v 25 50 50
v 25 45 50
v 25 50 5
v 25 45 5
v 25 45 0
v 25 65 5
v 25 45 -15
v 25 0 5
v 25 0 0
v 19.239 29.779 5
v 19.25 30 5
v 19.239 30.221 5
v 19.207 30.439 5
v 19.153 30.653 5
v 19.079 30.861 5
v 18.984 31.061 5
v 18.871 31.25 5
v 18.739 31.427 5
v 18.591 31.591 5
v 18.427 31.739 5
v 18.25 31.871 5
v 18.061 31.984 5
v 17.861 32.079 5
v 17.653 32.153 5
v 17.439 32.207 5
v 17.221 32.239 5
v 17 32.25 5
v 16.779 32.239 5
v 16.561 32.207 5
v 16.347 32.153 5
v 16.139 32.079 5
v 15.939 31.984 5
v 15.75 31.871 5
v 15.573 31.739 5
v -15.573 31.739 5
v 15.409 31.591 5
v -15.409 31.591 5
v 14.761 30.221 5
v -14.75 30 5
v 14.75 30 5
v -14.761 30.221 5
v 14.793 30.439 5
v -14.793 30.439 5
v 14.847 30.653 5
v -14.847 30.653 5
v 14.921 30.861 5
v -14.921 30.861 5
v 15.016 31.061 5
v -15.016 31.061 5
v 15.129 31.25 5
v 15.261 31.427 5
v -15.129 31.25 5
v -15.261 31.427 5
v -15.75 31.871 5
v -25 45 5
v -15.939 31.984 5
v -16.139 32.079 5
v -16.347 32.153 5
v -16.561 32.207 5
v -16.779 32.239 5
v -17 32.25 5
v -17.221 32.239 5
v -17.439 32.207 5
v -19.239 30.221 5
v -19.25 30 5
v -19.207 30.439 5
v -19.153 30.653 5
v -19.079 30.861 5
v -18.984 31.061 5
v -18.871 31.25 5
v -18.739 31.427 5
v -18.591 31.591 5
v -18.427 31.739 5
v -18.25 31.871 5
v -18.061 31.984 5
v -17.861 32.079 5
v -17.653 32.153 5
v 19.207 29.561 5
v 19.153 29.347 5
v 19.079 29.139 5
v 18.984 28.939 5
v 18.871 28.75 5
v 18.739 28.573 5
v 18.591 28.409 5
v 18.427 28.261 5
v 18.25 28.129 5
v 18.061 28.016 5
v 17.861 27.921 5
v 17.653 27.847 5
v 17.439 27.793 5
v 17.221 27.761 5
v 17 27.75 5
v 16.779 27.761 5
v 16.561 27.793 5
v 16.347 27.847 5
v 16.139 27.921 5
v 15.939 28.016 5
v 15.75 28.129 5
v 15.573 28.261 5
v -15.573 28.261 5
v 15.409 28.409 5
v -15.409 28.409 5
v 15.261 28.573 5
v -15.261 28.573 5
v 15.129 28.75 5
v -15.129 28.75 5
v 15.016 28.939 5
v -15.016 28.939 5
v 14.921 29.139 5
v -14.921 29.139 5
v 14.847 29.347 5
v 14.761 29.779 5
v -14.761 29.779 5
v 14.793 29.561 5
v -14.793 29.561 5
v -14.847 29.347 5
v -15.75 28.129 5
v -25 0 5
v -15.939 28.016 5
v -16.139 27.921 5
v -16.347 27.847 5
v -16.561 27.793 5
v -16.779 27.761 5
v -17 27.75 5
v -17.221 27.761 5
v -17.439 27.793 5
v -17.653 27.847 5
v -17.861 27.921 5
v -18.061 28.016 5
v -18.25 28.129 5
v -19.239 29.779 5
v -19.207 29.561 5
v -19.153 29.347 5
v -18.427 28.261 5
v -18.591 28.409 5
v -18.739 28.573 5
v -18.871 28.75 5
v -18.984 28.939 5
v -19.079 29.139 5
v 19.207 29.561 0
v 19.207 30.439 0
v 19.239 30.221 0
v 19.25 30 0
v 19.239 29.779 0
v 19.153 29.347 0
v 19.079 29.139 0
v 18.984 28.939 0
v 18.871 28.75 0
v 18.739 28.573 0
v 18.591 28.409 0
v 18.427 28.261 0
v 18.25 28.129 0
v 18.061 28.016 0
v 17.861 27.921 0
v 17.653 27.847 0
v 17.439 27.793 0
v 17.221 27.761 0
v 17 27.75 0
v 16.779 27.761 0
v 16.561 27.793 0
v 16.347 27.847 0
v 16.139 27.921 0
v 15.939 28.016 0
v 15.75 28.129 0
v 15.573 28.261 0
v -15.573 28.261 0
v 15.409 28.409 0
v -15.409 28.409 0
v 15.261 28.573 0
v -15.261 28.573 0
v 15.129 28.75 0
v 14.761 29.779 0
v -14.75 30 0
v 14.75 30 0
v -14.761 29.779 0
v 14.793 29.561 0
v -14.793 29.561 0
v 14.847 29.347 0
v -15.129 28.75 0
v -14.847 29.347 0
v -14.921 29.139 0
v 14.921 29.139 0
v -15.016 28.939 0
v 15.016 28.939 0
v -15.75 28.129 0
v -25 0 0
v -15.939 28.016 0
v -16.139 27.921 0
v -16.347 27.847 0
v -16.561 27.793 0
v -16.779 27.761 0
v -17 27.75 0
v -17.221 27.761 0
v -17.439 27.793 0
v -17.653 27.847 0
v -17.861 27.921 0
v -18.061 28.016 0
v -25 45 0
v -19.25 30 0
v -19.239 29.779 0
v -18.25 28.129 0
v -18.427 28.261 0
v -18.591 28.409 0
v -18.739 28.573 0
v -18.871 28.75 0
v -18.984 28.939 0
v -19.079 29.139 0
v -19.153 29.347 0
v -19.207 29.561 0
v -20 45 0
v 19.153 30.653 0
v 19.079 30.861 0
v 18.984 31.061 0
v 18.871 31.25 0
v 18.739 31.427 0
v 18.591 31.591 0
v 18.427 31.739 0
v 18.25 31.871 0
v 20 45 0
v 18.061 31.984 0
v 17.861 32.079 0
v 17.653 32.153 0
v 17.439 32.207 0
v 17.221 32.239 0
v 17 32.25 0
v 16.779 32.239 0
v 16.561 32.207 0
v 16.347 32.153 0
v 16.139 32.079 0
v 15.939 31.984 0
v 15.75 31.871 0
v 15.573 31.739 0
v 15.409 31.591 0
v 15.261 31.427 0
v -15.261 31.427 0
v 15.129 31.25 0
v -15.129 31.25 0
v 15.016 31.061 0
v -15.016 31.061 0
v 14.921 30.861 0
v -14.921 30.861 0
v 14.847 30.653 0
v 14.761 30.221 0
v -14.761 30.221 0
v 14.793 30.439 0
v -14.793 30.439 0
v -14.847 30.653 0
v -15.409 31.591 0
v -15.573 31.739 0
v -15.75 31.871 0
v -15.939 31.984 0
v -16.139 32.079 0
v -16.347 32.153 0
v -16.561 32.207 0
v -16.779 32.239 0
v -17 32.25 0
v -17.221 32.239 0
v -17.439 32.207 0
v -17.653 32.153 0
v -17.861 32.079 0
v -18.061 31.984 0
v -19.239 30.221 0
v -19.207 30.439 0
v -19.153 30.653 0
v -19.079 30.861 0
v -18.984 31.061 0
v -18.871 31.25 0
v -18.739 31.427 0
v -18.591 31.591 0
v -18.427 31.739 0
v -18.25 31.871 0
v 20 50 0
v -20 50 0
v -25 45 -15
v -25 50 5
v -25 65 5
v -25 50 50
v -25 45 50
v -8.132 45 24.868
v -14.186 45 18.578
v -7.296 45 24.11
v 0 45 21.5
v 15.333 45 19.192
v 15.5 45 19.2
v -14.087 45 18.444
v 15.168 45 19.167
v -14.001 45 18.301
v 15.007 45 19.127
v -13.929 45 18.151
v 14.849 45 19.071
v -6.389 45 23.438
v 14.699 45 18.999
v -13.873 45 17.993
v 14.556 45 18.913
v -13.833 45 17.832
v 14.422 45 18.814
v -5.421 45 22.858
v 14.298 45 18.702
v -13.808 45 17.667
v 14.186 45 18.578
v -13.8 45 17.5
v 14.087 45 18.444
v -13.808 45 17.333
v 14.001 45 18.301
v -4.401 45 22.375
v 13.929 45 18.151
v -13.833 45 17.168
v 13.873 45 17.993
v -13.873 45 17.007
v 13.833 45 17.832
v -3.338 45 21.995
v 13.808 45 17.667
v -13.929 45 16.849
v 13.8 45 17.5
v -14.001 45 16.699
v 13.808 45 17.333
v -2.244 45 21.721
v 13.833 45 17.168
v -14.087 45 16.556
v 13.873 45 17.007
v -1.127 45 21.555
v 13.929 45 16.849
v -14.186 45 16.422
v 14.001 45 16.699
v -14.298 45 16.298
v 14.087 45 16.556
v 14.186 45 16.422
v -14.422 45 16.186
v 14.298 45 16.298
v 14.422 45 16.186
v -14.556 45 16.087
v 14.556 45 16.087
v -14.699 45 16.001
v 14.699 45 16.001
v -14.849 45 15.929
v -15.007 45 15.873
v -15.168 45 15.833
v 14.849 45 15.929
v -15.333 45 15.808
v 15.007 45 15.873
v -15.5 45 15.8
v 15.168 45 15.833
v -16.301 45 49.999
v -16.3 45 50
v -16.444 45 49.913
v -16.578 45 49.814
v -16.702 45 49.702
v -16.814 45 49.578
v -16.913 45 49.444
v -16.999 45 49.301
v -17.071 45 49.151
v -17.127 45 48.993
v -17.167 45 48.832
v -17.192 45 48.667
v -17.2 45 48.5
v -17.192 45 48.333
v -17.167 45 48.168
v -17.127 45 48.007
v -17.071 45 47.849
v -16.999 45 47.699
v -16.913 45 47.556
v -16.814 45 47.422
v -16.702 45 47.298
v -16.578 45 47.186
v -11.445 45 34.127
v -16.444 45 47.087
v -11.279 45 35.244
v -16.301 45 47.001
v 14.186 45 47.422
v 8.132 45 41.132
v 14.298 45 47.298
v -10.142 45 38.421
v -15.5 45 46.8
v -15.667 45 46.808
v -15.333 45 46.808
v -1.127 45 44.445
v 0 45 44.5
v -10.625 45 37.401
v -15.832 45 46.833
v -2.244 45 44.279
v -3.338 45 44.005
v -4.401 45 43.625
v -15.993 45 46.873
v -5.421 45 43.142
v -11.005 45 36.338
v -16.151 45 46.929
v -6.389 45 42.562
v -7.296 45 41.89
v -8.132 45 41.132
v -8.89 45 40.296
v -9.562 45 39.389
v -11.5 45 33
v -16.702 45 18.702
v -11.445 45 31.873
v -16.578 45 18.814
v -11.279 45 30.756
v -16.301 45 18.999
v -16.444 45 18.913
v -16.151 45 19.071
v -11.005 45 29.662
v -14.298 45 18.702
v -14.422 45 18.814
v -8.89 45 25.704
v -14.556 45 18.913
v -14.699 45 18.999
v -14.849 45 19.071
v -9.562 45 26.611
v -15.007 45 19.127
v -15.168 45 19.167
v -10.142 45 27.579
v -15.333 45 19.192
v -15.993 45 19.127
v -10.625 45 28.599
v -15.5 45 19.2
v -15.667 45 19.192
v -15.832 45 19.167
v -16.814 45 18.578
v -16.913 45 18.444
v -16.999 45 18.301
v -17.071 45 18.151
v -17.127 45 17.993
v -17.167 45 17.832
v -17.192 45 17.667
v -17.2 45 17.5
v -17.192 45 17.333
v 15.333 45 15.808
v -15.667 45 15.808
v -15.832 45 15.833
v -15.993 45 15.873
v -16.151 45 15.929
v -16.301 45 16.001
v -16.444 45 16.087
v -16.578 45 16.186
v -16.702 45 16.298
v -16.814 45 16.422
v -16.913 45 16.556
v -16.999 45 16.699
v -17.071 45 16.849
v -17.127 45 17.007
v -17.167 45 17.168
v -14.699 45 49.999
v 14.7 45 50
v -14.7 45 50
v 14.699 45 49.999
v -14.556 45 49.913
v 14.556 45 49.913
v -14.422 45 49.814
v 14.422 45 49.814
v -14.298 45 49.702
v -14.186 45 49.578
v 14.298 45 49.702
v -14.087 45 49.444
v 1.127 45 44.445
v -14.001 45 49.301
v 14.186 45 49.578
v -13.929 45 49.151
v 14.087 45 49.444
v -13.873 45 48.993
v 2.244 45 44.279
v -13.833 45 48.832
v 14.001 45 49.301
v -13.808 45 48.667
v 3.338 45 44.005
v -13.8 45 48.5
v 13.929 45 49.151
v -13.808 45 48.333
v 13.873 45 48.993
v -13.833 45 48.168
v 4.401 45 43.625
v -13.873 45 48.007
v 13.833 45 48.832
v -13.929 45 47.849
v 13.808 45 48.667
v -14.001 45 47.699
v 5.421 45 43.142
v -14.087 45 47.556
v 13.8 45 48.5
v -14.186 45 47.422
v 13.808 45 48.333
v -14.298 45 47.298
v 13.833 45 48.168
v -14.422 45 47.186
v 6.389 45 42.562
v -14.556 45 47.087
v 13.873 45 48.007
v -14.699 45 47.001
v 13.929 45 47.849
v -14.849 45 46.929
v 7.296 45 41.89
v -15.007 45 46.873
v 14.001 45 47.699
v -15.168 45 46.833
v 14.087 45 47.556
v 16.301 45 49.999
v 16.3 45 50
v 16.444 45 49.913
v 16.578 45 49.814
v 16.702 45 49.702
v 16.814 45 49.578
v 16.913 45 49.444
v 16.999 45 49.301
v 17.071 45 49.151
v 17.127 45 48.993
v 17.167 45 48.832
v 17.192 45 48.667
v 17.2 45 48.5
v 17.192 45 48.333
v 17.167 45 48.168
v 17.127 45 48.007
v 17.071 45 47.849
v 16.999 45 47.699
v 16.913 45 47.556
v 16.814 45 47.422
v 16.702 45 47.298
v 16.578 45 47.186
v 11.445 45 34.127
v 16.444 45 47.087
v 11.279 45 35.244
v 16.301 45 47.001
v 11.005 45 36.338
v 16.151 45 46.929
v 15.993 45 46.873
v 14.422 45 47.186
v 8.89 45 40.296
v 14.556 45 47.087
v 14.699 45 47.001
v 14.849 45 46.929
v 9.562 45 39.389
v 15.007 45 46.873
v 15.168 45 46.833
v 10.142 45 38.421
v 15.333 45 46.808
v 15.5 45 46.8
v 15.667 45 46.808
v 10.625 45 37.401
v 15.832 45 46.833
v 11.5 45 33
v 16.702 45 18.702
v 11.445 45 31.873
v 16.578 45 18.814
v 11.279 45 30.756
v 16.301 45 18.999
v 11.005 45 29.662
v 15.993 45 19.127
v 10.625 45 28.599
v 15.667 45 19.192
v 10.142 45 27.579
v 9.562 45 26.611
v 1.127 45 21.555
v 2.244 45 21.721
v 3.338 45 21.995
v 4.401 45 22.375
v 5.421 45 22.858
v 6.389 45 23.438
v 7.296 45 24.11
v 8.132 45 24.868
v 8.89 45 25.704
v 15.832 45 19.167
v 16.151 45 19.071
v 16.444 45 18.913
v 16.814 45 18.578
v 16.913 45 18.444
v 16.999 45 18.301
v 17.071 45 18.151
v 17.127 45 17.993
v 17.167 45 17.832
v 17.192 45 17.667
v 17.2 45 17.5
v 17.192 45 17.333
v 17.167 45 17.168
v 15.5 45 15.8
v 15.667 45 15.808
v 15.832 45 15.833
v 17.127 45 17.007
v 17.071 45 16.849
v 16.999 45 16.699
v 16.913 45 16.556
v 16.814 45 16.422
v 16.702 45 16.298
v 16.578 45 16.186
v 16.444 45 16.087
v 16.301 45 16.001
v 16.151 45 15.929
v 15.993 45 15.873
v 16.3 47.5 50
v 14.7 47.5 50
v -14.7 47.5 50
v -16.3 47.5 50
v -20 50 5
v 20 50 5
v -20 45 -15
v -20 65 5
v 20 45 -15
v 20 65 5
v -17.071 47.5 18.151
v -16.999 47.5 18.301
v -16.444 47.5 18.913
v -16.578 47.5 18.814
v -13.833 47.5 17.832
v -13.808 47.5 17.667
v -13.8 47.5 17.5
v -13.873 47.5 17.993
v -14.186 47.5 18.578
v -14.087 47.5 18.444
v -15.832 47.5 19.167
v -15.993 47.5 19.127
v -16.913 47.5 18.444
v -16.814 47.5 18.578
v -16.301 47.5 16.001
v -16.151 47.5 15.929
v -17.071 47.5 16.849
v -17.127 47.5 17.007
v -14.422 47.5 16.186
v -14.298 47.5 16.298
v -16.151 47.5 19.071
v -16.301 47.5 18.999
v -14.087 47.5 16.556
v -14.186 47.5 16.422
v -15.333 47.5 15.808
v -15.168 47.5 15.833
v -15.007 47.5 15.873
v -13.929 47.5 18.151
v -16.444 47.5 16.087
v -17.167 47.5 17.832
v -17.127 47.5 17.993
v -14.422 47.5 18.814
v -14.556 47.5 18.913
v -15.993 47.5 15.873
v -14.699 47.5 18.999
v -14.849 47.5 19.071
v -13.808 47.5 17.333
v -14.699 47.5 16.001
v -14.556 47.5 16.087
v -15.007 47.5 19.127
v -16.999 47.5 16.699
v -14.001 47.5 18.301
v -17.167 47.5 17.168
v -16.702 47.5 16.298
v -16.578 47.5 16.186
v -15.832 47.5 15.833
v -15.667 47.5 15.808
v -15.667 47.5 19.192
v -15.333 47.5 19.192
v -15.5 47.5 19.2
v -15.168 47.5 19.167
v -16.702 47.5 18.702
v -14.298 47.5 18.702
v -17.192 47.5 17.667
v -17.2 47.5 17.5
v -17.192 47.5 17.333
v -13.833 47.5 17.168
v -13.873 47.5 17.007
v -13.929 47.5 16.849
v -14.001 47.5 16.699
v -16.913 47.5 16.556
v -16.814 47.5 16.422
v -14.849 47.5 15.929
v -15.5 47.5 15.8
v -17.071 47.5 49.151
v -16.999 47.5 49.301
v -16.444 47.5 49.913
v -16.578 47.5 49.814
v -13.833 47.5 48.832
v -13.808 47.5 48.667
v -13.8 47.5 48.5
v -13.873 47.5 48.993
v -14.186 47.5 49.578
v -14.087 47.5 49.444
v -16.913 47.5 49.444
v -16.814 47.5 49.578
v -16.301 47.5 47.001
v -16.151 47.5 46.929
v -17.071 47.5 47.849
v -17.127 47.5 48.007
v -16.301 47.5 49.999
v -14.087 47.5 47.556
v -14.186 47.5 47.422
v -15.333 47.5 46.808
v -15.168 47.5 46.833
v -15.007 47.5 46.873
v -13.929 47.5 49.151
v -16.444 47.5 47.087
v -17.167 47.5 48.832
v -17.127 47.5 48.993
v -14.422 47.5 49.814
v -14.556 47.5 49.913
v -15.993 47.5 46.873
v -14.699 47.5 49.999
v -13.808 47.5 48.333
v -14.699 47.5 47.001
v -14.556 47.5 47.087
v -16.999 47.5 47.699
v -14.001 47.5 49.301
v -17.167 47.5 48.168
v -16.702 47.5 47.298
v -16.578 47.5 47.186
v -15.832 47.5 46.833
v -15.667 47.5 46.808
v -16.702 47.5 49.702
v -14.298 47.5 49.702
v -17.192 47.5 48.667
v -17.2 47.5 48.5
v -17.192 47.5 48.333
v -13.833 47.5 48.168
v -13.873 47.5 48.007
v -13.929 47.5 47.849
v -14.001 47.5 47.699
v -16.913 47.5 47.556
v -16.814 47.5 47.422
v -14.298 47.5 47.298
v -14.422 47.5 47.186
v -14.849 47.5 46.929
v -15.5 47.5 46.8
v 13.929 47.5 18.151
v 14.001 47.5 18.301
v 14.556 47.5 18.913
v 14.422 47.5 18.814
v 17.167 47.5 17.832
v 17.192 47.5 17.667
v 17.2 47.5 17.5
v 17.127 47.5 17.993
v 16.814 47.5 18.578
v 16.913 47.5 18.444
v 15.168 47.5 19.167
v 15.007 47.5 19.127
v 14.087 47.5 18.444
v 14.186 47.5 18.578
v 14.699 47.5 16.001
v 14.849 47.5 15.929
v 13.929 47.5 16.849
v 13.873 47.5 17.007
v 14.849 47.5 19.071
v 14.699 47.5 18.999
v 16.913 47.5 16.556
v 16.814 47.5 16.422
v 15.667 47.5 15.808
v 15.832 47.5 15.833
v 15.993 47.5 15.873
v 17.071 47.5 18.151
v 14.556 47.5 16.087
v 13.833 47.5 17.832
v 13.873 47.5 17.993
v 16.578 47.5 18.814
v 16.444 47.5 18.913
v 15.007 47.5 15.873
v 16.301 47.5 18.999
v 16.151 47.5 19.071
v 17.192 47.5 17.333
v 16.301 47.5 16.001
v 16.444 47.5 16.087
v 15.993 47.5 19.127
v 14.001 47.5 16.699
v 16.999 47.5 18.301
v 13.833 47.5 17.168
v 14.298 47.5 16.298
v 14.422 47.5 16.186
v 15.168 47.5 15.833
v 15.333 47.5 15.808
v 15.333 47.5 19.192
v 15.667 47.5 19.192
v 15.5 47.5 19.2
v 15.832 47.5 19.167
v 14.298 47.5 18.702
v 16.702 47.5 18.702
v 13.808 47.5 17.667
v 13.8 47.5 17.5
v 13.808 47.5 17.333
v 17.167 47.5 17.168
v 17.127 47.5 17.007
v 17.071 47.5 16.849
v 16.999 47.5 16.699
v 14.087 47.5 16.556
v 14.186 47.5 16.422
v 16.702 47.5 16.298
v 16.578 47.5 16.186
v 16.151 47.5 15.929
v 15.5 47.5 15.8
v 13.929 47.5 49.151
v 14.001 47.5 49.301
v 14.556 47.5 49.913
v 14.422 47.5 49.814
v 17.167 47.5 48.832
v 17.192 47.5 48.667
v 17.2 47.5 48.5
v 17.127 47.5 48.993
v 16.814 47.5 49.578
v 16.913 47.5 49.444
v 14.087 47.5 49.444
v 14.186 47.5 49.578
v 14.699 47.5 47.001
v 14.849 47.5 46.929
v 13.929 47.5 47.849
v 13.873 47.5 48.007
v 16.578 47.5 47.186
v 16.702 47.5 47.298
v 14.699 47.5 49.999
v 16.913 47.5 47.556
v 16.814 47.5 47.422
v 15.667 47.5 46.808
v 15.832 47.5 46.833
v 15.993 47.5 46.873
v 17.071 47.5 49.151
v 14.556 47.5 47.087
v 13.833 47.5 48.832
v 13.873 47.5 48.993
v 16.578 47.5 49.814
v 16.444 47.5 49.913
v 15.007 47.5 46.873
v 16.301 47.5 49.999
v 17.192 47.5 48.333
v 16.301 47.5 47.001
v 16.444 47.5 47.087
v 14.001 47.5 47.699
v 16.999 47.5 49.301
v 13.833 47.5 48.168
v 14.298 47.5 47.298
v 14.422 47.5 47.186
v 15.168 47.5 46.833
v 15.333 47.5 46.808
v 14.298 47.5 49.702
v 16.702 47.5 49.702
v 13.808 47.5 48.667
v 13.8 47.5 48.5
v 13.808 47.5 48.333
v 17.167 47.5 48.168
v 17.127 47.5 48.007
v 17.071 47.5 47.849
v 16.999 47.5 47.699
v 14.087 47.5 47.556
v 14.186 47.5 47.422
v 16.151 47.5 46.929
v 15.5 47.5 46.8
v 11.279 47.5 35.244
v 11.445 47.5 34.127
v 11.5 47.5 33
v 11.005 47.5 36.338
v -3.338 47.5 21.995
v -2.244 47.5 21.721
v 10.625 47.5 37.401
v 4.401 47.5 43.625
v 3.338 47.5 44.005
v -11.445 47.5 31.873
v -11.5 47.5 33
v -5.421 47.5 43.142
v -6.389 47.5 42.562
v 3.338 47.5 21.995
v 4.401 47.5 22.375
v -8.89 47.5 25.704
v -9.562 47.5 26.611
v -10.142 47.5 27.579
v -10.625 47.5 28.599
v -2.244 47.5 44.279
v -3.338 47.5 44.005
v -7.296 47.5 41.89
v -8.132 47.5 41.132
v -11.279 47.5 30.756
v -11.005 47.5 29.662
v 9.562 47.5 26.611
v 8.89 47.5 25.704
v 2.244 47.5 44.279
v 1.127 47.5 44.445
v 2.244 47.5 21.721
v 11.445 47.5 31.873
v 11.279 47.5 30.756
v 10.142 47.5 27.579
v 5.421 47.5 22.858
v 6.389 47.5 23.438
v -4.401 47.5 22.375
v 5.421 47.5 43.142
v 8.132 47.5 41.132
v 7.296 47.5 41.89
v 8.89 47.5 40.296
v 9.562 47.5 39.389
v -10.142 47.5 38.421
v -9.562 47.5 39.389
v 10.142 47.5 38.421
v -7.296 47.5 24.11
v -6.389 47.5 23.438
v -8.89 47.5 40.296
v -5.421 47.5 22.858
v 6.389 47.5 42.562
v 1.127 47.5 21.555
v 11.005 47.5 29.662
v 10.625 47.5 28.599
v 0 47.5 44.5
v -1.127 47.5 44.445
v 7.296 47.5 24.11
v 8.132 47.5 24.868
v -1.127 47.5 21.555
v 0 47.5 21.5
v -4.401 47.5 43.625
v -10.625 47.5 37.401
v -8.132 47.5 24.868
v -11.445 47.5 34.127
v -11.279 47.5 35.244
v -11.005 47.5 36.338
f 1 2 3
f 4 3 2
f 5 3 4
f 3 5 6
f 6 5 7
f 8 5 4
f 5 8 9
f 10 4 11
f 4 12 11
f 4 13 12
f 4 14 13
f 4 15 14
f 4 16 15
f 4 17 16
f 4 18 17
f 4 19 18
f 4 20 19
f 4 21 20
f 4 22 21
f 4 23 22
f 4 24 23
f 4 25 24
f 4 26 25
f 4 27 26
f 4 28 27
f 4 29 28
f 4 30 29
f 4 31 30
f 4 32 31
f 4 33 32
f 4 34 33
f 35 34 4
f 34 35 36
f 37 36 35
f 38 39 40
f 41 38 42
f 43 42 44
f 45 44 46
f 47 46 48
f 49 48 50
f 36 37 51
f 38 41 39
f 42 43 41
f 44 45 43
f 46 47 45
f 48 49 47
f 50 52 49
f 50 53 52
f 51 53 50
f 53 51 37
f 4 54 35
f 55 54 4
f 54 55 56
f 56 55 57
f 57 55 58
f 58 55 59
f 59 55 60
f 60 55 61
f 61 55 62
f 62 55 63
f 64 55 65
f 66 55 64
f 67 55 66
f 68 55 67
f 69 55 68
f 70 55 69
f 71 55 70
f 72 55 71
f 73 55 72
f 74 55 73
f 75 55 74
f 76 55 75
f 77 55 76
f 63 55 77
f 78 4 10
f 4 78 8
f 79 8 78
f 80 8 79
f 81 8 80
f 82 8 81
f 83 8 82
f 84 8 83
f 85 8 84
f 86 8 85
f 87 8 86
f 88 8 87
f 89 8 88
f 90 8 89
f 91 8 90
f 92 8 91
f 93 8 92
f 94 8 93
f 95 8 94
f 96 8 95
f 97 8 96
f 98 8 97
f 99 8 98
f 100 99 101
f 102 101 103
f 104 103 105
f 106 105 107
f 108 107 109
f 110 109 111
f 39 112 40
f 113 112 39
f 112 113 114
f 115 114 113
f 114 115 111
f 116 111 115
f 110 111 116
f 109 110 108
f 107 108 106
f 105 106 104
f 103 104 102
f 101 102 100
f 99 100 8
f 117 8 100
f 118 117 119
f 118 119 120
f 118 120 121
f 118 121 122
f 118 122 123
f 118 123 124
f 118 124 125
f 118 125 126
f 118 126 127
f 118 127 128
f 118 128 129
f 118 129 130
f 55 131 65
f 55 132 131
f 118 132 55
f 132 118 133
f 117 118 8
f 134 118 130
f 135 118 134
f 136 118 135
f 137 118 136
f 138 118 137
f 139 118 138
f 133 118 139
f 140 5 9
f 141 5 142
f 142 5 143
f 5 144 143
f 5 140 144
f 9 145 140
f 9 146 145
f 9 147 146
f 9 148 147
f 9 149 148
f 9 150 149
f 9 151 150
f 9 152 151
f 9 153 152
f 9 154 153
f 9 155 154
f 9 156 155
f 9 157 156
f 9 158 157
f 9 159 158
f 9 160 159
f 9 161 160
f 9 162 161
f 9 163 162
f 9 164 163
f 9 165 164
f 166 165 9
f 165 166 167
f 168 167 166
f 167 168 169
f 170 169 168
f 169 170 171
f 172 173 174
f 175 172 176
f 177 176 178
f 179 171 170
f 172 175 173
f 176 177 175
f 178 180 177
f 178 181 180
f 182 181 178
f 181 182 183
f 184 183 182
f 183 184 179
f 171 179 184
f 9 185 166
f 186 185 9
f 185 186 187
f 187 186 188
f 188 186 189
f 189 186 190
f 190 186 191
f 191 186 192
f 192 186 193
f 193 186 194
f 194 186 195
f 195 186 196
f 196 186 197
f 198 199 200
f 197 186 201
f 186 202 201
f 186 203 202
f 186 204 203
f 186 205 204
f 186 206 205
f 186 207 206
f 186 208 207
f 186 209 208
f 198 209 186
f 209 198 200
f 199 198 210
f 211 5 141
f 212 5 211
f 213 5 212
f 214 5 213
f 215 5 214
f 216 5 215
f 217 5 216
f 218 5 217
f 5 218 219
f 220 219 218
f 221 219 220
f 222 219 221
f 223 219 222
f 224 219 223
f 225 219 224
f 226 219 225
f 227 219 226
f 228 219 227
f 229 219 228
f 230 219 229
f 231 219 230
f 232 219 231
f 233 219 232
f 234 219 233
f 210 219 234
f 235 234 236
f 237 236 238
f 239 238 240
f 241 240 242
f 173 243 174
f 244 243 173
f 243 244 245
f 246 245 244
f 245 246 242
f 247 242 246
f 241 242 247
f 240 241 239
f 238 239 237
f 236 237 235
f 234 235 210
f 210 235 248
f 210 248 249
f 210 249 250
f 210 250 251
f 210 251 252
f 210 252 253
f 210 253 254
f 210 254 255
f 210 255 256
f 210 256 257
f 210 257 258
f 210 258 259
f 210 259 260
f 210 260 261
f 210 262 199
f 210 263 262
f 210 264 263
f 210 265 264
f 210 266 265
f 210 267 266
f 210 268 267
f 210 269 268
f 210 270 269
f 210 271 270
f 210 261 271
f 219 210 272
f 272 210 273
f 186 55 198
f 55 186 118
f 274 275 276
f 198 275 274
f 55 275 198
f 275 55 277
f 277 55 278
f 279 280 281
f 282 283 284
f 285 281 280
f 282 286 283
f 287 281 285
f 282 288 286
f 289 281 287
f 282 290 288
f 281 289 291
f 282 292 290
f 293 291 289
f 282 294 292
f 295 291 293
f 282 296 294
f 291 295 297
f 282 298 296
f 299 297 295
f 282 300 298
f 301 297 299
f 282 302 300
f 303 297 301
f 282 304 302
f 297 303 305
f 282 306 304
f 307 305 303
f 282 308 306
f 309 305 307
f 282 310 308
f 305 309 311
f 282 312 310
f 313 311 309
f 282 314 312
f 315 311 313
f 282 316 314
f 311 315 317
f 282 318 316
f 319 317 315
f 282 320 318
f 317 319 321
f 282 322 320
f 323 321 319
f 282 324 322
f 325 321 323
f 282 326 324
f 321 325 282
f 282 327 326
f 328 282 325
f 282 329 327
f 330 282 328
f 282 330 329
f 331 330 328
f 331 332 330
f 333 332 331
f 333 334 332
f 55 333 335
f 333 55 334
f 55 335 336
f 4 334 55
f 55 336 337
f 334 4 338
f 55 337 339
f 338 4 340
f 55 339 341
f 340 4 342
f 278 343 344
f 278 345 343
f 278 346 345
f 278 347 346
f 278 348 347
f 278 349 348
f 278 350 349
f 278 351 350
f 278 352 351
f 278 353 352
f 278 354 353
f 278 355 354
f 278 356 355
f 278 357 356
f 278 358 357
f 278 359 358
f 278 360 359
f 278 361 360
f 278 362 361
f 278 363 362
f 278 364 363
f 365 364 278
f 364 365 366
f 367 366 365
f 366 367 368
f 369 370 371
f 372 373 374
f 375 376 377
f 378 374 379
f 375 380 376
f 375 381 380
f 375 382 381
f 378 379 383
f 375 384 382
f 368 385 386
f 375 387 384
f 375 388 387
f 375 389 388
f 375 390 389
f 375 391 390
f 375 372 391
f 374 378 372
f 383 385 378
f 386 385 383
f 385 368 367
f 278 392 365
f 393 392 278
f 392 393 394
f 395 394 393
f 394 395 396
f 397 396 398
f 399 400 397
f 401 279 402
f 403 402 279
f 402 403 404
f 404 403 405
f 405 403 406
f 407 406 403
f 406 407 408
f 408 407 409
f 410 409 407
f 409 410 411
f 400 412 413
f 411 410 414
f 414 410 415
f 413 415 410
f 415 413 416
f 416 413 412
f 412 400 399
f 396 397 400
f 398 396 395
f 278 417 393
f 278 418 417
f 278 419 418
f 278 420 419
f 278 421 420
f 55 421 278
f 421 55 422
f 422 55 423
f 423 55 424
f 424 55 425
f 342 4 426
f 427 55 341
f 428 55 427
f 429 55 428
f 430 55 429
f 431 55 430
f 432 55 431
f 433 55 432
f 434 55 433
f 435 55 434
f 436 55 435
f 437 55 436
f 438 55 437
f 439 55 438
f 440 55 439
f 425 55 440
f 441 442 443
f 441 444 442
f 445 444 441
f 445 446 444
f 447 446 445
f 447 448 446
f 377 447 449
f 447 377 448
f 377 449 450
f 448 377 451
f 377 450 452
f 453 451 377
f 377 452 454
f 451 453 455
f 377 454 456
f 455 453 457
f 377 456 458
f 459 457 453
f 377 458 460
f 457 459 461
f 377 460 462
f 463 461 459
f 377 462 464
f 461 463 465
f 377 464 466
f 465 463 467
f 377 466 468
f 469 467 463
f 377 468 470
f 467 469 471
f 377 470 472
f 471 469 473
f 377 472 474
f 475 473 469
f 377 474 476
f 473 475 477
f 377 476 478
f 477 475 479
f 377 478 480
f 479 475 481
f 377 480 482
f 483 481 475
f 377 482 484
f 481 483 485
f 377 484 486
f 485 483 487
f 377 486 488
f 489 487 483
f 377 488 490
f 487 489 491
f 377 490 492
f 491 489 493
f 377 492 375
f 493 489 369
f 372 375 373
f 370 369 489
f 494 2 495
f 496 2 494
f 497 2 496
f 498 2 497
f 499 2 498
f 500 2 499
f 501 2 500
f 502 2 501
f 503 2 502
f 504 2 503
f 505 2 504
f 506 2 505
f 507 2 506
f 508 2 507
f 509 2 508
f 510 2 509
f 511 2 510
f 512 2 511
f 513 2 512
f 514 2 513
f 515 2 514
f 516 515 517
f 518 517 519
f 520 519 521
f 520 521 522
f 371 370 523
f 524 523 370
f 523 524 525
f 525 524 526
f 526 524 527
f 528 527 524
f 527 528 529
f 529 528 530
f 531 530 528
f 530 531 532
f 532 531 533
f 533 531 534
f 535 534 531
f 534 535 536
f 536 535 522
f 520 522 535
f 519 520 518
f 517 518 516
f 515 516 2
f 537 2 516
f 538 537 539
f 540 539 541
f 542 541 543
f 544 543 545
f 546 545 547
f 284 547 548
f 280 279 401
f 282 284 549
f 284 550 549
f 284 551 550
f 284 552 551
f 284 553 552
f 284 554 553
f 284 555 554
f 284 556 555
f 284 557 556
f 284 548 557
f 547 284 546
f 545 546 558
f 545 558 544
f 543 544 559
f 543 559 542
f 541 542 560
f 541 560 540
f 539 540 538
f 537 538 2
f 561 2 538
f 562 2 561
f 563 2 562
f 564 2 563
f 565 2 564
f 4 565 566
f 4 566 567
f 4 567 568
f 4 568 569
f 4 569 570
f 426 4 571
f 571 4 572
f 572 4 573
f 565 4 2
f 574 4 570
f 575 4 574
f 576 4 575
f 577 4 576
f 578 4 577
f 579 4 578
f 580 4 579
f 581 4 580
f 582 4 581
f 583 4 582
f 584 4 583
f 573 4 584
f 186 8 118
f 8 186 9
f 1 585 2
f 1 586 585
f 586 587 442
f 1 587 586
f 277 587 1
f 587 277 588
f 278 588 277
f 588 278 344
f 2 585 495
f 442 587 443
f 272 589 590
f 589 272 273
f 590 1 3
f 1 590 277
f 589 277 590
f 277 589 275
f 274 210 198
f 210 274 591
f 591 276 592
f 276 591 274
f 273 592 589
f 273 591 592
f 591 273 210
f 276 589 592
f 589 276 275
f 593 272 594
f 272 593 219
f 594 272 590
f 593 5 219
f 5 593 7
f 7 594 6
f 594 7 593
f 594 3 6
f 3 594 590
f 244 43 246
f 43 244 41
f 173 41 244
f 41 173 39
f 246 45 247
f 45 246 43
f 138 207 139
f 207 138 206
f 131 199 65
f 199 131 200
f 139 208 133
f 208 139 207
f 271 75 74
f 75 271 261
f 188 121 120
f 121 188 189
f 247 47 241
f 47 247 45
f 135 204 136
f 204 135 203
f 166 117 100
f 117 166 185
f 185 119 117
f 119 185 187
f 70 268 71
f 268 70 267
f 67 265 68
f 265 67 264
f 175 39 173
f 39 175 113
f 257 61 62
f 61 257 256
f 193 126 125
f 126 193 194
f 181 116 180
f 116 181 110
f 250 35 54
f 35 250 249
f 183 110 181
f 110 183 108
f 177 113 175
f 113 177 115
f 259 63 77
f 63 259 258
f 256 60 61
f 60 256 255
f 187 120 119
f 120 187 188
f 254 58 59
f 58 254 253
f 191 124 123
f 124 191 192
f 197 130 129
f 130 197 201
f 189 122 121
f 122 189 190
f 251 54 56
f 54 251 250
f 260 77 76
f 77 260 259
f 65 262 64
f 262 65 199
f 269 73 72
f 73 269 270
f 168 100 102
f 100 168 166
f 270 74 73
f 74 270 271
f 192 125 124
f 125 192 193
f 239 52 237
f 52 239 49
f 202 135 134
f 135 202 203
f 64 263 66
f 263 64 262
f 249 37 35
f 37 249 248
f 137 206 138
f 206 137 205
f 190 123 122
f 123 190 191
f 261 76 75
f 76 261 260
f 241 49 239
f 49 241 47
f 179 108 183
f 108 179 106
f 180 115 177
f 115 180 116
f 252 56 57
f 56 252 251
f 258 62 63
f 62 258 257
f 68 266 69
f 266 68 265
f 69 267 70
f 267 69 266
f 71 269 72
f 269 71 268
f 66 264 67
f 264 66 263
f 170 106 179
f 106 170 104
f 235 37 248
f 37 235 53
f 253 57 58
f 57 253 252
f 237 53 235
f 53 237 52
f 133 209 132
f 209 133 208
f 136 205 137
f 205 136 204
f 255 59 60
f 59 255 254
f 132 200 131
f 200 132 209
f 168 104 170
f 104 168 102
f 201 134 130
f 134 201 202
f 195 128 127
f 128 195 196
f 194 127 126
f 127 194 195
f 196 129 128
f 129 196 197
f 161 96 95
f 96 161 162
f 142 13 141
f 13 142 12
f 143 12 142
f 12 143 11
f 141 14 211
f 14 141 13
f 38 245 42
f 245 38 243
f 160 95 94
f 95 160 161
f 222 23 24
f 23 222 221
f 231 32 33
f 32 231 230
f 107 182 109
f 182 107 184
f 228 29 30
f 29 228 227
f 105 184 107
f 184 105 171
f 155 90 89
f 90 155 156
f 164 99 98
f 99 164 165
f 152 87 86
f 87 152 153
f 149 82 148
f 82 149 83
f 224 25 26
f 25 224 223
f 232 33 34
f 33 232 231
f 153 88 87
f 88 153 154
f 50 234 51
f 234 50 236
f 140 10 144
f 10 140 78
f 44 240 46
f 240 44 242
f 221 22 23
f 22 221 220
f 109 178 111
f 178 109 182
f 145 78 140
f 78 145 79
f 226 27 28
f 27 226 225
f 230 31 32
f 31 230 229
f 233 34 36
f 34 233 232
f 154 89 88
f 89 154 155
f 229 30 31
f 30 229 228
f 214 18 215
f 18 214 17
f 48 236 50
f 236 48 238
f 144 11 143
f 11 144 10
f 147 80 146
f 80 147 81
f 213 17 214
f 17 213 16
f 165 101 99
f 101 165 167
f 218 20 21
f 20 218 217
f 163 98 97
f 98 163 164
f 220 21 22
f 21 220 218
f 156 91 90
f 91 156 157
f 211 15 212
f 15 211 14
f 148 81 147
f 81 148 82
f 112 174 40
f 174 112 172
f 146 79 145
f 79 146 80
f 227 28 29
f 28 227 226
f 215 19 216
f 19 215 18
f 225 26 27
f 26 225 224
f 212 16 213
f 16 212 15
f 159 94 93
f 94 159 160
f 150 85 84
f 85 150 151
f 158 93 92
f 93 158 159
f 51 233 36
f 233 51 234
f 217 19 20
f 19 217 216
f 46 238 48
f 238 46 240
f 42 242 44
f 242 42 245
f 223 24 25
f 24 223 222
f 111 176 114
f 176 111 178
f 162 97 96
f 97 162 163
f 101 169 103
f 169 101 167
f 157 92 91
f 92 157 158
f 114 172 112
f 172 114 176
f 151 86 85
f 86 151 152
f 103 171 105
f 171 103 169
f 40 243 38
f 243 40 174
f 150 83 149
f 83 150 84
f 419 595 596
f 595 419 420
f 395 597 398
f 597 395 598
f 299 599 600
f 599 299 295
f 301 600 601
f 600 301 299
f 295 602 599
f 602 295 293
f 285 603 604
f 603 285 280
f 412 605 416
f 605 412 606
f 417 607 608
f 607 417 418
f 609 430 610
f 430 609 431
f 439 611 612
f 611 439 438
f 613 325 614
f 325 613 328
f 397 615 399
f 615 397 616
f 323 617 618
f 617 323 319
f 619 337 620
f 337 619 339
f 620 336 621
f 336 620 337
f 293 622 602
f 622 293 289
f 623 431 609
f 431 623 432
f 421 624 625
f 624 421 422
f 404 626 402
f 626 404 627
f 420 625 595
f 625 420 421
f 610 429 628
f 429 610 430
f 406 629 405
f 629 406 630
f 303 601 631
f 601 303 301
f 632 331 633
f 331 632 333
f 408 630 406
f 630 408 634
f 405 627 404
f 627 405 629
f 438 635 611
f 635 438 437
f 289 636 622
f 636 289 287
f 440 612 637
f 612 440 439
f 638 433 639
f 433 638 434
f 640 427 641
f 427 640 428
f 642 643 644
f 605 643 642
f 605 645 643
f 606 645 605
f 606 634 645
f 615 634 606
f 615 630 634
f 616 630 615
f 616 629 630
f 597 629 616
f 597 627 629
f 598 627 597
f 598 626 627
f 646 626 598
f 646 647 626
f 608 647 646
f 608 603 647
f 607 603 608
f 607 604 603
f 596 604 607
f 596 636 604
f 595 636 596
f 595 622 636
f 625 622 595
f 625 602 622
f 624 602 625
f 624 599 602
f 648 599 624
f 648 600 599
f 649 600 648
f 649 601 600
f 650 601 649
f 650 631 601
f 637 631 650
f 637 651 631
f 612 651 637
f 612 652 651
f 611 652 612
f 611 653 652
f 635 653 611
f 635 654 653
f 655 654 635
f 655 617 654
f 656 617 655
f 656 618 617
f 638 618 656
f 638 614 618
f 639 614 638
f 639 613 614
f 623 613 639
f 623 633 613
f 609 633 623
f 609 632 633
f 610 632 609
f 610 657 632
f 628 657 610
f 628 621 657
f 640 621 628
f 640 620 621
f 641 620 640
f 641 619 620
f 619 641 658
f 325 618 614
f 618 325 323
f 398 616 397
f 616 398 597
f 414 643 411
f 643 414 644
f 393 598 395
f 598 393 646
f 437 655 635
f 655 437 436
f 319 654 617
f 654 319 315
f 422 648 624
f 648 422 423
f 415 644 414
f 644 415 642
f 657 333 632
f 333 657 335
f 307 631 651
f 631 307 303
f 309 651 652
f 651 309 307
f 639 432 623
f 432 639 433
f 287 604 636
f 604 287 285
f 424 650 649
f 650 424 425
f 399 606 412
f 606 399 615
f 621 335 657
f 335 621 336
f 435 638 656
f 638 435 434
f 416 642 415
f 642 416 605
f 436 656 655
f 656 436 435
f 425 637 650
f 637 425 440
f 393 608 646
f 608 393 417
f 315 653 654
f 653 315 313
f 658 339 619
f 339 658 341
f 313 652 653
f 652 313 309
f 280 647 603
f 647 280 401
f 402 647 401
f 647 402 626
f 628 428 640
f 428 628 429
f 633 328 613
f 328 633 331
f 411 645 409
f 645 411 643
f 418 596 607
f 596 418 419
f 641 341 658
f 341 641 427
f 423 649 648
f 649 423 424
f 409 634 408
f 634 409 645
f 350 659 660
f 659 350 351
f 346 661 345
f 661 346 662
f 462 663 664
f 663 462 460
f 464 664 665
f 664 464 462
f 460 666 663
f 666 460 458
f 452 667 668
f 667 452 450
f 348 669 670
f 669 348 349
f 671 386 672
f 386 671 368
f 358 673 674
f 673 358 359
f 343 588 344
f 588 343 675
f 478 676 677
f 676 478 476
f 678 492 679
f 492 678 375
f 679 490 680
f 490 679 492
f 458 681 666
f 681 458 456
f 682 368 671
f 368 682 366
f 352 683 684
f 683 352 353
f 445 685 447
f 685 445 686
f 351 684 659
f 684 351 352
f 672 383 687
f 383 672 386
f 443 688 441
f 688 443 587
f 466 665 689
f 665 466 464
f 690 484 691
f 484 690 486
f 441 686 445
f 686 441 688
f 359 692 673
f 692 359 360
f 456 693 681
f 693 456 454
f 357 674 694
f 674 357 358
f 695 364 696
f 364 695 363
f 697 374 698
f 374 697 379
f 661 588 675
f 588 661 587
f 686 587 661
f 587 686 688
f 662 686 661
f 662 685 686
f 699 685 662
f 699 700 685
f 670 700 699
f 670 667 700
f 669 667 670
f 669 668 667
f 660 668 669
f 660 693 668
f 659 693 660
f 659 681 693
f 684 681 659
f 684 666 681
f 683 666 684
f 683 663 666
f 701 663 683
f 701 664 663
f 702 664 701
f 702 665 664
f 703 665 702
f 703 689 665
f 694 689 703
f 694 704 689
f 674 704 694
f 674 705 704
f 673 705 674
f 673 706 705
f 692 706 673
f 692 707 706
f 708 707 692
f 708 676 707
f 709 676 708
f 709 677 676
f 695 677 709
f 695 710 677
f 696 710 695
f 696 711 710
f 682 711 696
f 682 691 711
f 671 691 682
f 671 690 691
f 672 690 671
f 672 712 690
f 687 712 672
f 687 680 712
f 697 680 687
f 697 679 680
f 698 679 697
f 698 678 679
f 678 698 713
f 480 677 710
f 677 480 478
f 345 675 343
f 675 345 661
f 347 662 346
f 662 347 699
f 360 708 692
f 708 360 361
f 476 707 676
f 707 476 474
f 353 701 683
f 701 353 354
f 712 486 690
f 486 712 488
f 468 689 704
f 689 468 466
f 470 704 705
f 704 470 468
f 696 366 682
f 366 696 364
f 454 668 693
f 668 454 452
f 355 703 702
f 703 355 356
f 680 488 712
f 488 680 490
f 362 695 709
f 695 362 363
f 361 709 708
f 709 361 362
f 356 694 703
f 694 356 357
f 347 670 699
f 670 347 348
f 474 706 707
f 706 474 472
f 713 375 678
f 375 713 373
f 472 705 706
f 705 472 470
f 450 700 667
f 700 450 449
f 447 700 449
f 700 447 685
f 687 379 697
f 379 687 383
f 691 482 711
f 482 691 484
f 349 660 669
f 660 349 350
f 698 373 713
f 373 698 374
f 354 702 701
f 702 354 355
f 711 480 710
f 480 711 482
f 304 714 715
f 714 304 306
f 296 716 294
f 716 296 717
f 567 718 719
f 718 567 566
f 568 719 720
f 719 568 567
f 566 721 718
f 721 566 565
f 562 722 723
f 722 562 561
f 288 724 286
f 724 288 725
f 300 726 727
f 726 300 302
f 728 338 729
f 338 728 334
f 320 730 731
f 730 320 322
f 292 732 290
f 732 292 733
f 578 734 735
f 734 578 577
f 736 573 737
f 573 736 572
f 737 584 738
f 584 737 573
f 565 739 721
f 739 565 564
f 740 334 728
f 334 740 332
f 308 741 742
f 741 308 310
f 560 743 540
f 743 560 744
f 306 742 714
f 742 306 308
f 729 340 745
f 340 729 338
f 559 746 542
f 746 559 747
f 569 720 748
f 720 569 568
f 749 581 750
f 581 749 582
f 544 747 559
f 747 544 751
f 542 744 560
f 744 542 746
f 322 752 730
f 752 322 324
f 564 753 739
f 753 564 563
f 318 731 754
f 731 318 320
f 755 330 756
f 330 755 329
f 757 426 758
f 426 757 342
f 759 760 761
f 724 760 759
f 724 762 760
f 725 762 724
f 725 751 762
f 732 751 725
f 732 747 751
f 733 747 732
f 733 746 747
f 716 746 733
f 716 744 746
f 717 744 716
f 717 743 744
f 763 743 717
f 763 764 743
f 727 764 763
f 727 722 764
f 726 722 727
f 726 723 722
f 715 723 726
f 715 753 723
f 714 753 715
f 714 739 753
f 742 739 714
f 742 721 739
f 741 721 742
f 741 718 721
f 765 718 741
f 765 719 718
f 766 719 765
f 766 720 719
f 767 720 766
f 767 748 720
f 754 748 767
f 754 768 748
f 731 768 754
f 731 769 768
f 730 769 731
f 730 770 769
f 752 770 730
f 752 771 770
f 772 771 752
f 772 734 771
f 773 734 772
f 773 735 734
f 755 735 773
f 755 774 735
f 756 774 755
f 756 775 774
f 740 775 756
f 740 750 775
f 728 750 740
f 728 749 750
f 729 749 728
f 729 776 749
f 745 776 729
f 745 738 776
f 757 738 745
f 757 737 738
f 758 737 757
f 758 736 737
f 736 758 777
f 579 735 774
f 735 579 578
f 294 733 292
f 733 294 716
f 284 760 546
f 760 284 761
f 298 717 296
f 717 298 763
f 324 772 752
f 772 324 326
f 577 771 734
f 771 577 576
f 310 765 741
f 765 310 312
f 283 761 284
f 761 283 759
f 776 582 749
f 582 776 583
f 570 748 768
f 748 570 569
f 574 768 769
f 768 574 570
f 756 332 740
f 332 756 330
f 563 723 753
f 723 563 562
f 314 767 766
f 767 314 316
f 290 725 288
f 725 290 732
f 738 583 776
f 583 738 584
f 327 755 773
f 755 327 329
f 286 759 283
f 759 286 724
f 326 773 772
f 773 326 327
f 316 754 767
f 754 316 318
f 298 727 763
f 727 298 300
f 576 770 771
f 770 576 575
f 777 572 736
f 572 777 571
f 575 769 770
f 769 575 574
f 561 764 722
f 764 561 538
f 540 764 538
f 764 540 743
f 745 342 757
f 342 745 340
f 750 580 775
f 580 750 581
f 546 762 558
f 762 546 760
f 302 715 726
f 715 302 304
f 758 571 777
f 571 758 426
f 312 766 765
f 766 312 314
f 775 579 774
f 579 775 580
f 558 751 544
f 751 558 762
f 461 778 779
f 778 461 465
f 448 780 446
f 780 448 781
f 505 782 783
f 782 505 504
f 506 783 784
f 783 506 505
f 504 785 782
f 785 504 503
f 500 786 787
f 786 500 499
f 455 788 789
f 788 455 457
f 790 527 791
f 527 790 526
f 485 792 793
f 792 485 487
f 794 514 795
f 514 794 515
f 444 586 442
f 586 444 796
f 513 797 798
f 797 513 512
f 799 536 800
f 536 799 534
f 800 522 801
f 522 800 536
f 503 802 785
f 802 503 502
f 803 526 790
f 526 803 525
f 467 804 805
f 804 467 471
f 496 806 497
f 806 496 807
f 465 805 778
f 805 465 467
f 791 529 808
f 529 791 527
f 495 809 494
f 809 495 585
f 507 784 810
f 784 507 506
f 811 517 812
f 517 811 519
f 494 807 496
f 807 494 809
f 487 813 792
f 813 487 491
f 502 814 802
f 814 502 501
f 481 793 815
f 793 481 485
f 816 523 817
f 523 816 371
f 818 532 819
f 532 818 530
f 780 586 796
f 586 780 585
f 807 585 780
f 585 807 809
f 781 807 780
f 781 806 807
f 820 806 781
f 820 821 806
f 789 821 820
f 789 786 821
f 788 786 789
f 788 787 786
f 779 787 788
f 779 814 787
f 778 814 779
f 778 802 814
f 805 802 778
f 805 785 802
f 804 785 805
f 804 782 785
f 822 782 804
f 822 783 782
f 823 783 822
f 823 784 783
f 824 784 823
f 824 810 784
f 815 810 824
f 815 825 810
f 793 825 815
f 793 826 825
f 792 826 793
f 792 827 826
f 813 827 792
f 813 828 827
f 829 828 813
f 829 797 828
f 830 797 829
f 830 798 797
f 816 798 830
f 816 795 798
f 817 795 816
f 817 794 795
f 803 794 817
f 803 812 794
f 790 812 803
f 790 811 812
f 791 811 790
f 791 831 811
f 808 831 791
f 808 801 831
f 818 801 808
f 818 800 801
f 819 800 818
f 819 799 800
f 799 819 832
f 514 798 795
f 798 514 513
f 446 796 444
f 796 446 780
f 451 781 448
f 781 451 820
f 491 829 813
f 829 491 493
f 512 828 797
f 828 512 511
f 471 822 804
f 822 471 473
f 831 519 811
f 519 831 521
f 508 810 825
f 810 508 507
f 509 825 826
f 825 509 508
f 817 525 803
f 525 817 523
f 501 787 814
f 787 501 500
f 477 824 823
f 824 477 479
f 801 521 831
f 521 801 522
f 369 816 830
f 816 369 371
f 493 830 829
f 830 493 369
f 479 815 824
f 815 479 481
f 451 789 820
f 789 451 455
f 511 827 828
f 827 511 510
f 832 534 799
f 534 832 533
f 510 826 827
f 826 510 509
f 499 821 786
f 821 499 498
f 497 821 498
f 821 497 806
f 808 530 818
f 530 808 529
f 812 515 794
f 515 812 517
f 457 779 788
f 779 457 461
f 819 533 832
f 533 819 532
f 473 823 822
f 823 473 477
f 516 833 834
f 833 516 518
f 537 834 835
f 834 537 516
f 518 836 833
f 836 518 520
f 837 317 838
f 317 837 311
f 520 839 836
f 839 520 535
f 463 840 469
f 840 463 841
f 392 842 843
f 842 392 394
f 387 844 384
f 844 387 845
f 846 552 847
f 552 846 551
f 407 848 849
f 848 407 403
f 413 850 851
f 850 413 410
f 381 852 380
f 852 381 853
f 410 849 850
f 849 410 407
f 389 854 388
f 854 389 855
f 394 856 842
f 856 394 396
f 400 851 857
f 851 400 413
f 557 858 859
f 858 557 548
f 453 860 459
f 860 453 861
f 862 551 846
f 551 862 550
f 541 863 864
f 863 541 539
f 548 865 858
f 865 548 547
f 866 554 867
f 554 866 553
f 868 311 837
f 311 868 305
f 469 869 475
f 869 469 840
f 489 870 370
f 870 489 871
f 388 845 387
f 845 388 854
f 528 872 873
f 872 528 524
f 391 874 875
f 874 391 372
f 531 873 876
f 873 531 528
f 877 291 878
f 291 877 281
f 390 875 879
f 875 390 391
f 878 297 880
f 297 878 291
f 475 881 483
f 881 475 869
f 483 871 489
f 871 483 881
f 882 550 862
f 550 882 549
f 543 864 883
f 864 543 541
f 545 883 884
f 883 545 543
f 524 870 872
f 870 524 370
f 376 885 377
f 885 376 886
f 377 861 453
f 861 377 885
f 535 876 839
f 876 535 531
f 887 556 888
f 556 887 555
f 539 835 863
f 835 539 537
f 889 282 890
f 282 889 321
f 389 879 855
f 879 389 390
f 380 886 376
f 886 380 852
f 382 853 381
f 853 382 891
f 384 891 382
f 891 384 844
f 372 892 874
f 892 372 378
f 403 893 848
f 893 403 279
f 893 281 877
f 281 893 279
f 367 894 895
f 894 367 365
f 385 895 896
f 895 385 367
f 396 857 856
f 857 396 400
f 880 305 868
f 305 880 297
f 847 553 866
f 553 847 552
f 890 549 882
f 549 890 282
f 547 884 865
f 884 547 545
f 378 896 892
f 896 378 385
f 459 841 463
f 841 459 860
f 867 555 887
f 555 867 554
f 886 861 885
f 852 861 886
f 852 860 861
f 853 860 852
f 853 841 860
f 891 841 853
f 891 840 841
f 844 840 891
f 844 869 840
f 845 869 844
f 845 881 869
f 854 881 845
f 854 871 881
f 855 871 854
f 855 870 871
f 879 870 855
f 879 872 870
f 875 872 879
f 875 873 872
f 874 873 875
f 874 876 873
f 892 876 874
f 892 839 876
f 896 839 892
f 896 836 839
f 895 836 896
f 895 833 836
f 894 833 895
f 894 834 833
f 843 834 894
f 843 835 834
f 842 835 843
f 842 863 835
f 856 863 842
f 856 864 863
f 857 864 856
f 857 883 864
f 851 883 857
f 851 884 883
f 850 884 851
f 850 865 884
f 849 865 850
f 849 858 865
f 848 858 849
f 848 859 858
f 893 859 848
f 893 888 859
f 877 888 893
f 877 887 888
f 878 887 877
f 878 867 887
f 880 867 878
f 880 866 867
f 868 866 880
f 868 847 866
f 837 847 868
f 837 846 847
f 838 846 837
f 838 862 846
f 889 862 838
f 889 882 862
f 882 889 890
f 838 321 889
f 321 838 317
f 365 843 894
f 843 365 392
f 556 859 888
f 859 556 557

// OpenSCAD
// ------------------- Parameters (mm) -------------------
// Base plate
base_x = 50;          // width  (x: -25 .. 25)
base_y = 45;          // length (y: 0 .. 45)
base_z = 5;           // thickness (z: 0 .. 5)

// Motor plate (vertical)
motor_x = 50;         // width (same as base)
motor_y = 5;          // thickness along Y (back edge of base)
motor_z = 50;         // height along Z

// Hole dimensions
m4_d = 4.5;           // M4 through‑hole diameter
m4_r = m4_d/2;

m3_d = 3.4;           // M3 screw hole diameter
m3_r = m3_d/2;

boss_d = 23;          // motor centring boss hole diameter
boss_r = boss_d/2;
boss_z = 28;          // Z‑center of boss hole (relative to overall Z=0)

// Gusset geometry
gusset_thick = 5;     // thickness in X direction
gusset_leg = 20;      // leg length in Y and Z

$fn = 64;             // resolution for circles/cylinders

// ------------------- Solid parts -------------------
module solid_parts() {
    union() {
        // Base plate (lies on the bed)
        translate([-25, 0, 0])
            cube([base_x, base_y, base_z], center = false);

        // Motor plate (vertical, standing on back edge of base)
        translate([-25, base_y, 0])
            cube([motor_x, motor_y, motor_z], center = false);

        // Left gusset (x = -25 .. -20)
        gusset(-25);

        // Right gusset (x = 20 .. 25)
        gusset(20);
    }
}

// Gusset module: creates a right‑triangle prism of thickness gusset_thick
// positioned so that its right‑angle corner sits at (corner_x, base_y, base_z)
module gusset(corner_x) {
    // triangle defined in the XY plane (points (0,0), (gusset_leg,0), (0,gusset_leg))
    // after rotation it will lie in the YZ plane, and extrusion will give X‑thickness
    translate([corner_x, base_y, base_z])          // move corner to correct location
        rotate([0, 90, 0])                         // rotate so extrusion goes along X
            linear_extrude(height = gusset_thick) // thickness in X
                polygon(points = [[0,0],
                                   [gusset_leg,0],
                                   [0,gusset_leg]]);
}

// ------------------- Cutting features -------------------
module cut_features() {
    union() {
        // M4 through‑holes in base plate
        for (pos = [[-17,30], [17,30]]) {
            translate([pos[0], pos[1], -0.5])          // extend below and above the plate
                cylinder(r = m4_r, h = base_z + 1);
        }

        // Boss hole (oriented along Y) in motor plate
        translate([0, base_y + motor_y/2, base_z + boss_z]) // centre at correct Z
            rotate([90,0,0])                               // rotate cylinder to Y‑axis
                cylinder(r = boss_r, h = motor_y + 2);    // extend beyond Y faces

        // Four M3 screw holes (oriented along Y) in motor plate
        for (dx = [-15.5, 15.5])
            for (dz = [-15.5, 15.5])
                translate([dx, base_y + motor_y/2, base_z + boss_z + dz])
                    rotate([90,0,0])
                        cylinder(r = m3_r, h = motor_y + 2);
    }
}

// ------------------- Final model -------------------
difference() {
    solid_parts();
    cut_features();
}
